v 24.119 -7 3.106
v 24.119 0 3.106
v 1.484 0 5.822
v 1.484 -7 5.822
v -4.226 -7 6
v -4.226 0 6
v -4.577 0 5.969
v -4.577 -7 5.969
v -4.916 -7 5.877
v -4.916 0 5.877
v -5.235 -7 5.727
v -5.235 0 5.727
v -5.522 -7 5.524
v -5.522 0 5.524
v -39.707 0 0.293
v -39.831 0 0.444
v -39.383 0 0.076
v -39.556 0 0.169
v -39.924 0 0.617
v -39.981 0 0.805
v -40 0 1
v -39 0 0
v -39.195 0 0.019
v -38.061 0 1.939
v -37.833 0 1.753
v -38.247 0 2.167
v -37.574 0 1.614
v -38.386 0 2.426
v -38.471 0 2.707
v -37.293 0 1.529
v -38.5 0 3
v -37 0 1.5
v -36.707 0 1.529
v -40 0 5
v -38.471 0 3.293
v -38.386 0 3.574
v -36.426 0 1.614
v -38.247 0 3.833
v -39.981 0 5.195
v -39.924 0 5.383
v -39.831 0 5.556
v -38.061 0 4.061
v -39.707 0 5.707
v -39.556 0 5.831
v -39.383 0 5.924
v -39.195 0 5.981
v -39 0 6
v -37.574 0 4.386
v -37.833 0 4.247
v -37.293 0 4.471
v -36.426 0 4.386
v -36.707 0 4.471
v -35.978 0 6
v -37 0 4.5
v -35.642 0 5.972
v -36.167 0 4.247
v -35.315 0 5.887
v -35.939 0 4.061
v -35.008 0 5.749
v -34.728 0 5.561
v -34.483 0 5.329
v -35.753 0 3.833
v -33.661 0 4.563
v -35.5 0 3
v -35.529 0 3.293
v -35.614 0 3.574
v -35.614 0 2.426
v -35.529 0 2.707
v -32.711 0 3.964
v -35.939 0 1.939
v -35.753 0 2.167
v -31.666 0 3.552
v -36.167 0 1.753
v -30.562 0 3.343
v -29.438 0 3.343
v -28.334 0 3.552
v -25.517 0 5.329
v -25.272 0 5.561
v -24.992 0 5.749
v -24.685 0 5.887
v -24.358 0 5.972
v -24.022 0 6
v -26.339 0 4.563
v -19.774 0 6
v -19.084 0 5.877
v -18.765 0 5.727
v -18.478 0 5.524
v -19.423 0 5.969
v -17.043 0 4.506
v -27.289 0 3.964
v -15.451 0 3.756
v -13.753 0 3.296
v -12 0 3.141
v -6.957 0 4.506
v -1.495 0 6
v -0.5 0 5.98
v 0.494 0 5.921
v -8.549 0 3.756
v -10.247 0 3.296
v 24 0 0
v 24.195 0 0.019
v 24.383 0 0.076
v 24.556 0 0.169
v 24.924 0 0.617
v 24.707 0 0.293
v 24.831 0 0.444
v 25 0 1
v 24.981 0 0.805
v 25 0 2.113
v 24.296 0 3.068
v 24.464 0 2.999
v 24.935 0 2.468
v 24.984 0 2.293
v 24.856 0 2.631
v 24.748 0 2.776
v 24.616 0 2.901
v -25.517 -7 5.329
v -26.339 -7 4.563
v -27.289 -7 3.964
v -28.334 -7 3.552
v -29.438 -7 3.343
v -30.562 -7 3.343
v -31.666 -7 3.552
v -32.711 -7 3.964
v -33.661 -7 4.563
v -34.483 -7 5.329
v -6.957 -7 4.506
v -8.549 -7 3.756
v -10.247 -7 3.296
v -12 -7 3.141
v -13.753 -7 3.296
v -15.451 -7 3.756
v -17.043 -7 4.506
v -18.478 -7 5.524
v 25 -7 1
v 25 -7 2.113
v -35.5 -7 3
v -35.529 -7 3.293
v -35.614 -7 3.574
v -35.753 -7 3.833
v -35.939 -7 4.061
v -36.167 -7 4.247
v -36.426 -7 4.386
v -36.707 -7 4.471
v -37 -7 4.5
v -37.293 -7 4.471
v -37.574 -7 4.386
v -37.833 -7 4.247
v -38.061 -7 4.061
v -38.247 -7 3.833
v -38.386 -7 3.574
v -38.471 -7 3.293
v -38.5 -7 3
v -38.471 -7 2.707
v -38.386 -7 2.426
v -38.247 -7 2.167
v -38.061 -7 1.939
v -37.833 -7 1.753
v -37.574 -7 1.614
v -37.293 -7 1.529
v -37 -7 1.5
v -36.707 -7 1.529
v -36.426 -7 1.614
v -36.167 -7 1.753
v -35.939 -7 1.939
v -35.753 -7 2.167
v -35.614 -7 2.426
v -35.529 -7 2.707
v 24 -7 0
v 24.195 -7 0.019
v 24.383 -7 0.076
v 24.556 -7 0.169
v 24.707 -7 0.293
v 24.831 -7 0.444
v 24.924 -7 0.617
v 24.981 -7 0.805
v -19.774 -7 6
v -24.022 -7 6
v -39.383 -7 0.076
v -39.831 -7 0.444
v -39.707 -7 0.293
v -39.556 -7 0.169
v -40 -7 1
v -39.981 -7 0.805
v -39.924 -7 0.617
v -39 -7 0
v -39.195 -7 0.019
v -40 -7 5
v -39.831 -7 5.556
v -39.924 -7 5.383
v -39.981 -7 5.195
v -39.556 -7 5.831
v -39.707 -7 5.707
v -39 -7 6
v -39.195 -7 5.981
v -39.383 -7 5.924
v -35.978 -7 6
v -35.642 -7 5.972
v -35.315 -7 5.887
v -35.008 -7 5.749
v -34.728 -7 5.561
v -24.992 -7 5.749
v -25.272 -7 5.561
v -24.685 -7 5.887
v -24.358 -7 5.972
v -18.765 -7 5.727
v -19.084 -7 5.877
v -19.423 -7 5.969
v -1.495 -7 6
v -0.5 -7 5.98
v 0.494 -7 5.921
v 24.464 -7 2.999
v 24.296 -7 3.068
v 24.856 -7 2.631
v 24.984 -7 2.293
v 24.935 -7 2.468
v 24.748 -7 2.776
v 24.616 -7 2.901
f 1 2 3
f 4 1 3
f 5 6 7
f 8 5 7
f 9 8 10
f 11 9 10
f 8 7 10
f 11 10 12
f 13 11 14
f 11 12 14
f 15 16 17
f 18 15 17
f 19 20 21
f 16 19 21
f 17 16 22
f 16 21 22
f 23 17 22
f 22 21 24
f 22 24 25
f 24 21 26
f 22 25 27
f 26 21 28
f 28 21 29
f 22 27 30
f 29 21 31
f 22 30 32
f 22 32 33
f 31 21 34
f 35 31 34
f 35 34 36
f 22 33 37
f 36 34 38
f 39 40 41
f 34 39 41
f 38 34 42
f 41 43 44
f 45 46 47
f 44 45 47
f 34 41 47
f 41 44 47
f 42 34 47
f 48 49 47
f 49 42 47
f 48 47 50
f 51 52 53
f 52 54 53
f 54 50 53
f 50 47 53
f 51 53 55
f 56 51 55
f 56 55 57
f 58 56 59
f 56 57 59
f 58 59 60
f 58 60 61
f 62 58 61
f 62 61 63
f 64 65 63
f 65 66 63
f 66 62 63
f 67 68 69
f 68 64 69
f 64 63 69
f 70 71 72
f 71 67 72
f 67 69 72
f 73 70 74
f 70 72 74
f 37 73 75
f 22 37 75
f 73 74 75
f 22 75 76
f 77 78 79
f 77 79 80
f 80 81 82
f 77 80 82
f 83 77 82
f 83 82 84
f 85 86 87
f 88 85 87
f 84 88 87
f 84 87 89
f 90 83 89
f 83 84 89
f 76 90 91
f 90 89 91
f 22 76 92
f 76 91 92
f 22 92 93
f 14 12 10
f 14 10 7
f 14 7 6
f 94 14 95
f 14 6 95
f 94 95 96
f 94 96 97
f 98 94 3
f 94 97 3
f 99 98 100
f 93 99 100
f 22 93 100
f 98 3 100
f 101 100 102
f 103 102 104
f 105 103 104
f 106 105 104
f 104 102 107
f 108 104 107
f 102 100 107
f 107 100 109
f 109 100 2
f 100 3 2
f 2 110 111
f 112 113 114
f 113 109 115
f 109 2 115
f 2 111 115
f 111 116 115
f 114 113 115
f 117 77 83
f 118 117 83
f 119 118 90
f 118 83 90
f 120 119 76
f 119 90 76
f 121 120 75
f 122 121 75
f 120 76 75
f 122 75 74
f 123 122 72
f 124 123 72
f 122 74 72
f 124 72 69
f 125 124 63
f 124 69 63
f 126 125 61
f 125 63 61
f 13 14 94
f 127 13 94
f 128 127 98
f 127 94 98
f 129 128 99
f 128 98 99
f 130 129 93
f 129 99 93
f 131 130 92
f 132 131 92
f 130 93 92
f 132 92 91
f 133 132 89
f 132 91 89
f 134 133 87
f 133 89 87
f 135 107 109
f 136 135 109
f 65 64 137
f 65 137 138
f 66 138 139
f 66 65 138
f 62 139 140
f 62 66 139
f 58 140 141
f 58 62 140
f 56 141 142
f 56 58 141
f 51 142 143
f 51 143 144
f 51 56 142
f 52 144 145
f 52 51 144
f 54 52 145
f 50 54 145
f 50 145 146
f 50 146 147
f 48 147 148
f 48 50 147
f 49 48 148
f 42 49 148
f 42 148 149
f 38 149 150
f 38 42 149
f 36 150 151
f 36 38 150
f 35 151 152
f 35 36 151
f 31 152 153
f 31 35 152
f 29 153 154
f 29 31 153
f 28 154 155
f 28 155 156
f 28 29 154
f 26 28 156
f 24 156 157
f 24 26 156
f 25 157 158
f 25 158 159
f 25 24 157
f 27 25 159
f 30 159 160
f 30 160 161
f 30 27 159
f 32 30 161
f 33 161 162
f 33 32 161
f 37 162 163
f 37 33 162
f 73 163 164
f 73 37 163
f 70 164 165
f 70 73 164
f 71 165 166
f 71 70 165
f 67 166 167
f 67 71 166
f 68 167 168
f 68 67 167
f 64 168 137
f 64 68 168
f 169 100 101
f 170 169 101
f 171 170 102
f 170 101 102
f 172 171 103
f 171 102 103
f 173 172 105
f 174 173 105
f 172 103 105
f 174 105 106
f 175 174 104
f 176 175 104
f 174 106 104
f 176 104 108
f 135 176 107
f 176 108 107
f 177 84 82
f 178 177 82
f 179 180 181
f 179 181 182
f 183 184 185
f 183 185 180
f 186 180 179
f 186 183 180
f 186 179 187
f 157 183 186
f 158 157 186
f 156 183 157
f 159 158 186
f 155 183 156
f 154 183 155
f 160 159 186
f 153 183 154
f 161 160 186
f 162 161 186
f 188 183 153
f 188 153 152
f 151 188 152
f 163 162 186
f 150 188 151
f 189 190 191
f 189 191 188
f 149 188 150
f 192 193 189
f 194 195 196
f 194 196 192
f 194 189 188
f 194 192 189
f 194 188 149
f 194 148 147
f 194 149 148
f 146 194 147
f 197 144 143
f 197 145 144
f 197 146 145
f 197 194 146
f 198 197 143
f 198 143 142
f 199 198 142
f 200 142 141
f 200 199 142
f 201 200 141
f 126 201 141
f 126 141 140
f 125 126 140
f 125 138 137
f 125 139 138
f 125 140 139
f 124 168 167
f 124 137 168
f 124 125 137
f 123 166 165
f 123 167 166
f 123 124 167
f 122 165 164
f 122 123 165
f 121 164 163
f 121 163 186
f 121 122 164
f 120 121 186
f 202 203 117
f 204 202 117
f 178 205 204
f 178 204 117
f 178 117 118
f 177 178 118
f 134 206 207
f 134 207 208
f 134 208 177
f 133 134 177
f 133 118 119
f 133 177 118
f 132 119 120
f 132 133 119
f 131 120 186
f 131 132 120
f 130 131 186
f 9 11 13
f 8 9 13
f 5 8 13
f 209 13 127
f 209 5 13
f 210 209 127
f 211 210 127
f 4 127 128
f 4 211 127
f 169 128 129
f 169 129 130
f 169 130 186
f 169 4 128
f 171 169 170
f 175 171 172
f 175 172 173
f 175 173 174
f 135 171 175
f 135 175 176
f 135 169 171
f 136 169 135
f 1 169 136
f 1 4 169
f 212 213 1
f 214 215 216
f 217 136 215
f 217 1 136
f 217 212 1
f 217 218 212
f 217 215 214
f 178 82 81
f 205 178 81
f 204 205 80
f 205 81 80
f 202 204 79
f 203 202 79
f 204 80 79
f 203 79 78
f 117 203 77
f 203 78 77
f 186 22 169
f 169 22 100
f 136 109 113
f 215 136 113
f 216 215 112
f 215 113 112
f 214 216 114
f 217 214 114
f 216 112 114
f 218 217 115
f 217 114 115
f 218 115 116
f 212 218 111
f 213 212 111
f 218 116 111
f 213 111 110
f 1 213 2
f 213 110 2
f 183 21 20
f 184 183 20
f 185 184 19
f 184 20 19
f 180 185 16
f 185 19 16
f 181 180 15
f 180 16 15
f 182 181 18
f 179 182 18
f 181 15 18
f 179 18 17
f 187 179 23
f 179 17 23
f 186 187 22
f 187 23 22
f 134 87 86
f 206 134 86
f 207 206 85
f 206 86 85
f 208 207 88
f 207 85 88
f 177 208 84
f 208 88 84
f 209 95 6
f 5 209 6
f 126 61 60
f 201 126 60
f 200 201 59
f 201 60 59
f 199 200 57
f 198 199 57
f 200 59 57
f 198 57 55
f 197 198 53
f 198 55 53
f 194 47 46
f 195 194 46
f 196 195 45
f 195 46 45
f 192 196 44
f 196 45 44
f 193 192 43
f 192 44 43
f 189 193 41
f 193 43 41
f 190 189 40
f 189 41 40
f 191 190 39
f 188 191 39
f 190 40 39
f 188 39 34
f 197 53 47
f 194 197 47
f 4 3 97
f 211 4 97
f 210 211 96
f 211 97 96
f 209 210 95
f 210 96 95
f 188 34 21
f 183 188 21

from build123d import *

# Parameters (mm, degrees)
F0_R     = 1.5
F1_DEPTH = 7


with BuildPart() as f1:
    # F0 (on Front) → F1 (new body)
    with BuildSketch(Plane.XZ):
        with BuildLine():
            Line((-39, 0), (0, 0))
            Line((0, 0), (24, 0))
            ThreePointArc((24, 0), (24.707107, 0.292893), (25, 1))
            Line((25, 1), (25, 2.112826))
            ThreePointArc((25, 2.112826), (24.748046, 2.776473), (24.119145, 3.105703))
            Line((24.119145, 3.105703), (1.483992, 5.821921))
            ThreePointArc((1.483992, 5.821921), (-0.002664, 5.955441), (-1.494639, 6))
            Line((-1.494639, 6), (-4.226051, 6))
            ThreePointArc((-4.226051, 6), (-4.916289, 5.877118), (-5.521709, 5.523571))
            ThreePointArc((-5.521709, 5.523571), (-12, 3.141428), (-18.478291, 5.523571))
            ThreePointArc((-18.478291, 5.523571), (-19.083711, 5.877118), (-19.773949, 6))
            Line((-19.773949, 6), (-24.02225, 6))
            ThreePointArc((-24.02225, 6), (-24.8413, 5.824598), (-25.516687, 5.329156))
            ThreePointArc((-25.516687, 5.329156), (-30, 3.316625), (-34.483313, 5.329156))
            ThreePointArc((-34.483313, 5.329156), (-35.1587, 5.824598), (-35.97775, 6))
            Line((-35.97775, 6), (-39, 6))
            ThreePointArc((-39, 6), (-39.707107, 5.707107), (-40, 5))
            Line((-40, 5), (-40, 1))
            ThreePointArc((-40, 1), (-39.707107, 0.292893), (-39, 0))
        make_face()
        with Locations((-37, 3)):
            Circle(F0_R, mode=Mode.SUBTRACT)
    extrude(amount=F1_DEPTH)


solid = f1.part
